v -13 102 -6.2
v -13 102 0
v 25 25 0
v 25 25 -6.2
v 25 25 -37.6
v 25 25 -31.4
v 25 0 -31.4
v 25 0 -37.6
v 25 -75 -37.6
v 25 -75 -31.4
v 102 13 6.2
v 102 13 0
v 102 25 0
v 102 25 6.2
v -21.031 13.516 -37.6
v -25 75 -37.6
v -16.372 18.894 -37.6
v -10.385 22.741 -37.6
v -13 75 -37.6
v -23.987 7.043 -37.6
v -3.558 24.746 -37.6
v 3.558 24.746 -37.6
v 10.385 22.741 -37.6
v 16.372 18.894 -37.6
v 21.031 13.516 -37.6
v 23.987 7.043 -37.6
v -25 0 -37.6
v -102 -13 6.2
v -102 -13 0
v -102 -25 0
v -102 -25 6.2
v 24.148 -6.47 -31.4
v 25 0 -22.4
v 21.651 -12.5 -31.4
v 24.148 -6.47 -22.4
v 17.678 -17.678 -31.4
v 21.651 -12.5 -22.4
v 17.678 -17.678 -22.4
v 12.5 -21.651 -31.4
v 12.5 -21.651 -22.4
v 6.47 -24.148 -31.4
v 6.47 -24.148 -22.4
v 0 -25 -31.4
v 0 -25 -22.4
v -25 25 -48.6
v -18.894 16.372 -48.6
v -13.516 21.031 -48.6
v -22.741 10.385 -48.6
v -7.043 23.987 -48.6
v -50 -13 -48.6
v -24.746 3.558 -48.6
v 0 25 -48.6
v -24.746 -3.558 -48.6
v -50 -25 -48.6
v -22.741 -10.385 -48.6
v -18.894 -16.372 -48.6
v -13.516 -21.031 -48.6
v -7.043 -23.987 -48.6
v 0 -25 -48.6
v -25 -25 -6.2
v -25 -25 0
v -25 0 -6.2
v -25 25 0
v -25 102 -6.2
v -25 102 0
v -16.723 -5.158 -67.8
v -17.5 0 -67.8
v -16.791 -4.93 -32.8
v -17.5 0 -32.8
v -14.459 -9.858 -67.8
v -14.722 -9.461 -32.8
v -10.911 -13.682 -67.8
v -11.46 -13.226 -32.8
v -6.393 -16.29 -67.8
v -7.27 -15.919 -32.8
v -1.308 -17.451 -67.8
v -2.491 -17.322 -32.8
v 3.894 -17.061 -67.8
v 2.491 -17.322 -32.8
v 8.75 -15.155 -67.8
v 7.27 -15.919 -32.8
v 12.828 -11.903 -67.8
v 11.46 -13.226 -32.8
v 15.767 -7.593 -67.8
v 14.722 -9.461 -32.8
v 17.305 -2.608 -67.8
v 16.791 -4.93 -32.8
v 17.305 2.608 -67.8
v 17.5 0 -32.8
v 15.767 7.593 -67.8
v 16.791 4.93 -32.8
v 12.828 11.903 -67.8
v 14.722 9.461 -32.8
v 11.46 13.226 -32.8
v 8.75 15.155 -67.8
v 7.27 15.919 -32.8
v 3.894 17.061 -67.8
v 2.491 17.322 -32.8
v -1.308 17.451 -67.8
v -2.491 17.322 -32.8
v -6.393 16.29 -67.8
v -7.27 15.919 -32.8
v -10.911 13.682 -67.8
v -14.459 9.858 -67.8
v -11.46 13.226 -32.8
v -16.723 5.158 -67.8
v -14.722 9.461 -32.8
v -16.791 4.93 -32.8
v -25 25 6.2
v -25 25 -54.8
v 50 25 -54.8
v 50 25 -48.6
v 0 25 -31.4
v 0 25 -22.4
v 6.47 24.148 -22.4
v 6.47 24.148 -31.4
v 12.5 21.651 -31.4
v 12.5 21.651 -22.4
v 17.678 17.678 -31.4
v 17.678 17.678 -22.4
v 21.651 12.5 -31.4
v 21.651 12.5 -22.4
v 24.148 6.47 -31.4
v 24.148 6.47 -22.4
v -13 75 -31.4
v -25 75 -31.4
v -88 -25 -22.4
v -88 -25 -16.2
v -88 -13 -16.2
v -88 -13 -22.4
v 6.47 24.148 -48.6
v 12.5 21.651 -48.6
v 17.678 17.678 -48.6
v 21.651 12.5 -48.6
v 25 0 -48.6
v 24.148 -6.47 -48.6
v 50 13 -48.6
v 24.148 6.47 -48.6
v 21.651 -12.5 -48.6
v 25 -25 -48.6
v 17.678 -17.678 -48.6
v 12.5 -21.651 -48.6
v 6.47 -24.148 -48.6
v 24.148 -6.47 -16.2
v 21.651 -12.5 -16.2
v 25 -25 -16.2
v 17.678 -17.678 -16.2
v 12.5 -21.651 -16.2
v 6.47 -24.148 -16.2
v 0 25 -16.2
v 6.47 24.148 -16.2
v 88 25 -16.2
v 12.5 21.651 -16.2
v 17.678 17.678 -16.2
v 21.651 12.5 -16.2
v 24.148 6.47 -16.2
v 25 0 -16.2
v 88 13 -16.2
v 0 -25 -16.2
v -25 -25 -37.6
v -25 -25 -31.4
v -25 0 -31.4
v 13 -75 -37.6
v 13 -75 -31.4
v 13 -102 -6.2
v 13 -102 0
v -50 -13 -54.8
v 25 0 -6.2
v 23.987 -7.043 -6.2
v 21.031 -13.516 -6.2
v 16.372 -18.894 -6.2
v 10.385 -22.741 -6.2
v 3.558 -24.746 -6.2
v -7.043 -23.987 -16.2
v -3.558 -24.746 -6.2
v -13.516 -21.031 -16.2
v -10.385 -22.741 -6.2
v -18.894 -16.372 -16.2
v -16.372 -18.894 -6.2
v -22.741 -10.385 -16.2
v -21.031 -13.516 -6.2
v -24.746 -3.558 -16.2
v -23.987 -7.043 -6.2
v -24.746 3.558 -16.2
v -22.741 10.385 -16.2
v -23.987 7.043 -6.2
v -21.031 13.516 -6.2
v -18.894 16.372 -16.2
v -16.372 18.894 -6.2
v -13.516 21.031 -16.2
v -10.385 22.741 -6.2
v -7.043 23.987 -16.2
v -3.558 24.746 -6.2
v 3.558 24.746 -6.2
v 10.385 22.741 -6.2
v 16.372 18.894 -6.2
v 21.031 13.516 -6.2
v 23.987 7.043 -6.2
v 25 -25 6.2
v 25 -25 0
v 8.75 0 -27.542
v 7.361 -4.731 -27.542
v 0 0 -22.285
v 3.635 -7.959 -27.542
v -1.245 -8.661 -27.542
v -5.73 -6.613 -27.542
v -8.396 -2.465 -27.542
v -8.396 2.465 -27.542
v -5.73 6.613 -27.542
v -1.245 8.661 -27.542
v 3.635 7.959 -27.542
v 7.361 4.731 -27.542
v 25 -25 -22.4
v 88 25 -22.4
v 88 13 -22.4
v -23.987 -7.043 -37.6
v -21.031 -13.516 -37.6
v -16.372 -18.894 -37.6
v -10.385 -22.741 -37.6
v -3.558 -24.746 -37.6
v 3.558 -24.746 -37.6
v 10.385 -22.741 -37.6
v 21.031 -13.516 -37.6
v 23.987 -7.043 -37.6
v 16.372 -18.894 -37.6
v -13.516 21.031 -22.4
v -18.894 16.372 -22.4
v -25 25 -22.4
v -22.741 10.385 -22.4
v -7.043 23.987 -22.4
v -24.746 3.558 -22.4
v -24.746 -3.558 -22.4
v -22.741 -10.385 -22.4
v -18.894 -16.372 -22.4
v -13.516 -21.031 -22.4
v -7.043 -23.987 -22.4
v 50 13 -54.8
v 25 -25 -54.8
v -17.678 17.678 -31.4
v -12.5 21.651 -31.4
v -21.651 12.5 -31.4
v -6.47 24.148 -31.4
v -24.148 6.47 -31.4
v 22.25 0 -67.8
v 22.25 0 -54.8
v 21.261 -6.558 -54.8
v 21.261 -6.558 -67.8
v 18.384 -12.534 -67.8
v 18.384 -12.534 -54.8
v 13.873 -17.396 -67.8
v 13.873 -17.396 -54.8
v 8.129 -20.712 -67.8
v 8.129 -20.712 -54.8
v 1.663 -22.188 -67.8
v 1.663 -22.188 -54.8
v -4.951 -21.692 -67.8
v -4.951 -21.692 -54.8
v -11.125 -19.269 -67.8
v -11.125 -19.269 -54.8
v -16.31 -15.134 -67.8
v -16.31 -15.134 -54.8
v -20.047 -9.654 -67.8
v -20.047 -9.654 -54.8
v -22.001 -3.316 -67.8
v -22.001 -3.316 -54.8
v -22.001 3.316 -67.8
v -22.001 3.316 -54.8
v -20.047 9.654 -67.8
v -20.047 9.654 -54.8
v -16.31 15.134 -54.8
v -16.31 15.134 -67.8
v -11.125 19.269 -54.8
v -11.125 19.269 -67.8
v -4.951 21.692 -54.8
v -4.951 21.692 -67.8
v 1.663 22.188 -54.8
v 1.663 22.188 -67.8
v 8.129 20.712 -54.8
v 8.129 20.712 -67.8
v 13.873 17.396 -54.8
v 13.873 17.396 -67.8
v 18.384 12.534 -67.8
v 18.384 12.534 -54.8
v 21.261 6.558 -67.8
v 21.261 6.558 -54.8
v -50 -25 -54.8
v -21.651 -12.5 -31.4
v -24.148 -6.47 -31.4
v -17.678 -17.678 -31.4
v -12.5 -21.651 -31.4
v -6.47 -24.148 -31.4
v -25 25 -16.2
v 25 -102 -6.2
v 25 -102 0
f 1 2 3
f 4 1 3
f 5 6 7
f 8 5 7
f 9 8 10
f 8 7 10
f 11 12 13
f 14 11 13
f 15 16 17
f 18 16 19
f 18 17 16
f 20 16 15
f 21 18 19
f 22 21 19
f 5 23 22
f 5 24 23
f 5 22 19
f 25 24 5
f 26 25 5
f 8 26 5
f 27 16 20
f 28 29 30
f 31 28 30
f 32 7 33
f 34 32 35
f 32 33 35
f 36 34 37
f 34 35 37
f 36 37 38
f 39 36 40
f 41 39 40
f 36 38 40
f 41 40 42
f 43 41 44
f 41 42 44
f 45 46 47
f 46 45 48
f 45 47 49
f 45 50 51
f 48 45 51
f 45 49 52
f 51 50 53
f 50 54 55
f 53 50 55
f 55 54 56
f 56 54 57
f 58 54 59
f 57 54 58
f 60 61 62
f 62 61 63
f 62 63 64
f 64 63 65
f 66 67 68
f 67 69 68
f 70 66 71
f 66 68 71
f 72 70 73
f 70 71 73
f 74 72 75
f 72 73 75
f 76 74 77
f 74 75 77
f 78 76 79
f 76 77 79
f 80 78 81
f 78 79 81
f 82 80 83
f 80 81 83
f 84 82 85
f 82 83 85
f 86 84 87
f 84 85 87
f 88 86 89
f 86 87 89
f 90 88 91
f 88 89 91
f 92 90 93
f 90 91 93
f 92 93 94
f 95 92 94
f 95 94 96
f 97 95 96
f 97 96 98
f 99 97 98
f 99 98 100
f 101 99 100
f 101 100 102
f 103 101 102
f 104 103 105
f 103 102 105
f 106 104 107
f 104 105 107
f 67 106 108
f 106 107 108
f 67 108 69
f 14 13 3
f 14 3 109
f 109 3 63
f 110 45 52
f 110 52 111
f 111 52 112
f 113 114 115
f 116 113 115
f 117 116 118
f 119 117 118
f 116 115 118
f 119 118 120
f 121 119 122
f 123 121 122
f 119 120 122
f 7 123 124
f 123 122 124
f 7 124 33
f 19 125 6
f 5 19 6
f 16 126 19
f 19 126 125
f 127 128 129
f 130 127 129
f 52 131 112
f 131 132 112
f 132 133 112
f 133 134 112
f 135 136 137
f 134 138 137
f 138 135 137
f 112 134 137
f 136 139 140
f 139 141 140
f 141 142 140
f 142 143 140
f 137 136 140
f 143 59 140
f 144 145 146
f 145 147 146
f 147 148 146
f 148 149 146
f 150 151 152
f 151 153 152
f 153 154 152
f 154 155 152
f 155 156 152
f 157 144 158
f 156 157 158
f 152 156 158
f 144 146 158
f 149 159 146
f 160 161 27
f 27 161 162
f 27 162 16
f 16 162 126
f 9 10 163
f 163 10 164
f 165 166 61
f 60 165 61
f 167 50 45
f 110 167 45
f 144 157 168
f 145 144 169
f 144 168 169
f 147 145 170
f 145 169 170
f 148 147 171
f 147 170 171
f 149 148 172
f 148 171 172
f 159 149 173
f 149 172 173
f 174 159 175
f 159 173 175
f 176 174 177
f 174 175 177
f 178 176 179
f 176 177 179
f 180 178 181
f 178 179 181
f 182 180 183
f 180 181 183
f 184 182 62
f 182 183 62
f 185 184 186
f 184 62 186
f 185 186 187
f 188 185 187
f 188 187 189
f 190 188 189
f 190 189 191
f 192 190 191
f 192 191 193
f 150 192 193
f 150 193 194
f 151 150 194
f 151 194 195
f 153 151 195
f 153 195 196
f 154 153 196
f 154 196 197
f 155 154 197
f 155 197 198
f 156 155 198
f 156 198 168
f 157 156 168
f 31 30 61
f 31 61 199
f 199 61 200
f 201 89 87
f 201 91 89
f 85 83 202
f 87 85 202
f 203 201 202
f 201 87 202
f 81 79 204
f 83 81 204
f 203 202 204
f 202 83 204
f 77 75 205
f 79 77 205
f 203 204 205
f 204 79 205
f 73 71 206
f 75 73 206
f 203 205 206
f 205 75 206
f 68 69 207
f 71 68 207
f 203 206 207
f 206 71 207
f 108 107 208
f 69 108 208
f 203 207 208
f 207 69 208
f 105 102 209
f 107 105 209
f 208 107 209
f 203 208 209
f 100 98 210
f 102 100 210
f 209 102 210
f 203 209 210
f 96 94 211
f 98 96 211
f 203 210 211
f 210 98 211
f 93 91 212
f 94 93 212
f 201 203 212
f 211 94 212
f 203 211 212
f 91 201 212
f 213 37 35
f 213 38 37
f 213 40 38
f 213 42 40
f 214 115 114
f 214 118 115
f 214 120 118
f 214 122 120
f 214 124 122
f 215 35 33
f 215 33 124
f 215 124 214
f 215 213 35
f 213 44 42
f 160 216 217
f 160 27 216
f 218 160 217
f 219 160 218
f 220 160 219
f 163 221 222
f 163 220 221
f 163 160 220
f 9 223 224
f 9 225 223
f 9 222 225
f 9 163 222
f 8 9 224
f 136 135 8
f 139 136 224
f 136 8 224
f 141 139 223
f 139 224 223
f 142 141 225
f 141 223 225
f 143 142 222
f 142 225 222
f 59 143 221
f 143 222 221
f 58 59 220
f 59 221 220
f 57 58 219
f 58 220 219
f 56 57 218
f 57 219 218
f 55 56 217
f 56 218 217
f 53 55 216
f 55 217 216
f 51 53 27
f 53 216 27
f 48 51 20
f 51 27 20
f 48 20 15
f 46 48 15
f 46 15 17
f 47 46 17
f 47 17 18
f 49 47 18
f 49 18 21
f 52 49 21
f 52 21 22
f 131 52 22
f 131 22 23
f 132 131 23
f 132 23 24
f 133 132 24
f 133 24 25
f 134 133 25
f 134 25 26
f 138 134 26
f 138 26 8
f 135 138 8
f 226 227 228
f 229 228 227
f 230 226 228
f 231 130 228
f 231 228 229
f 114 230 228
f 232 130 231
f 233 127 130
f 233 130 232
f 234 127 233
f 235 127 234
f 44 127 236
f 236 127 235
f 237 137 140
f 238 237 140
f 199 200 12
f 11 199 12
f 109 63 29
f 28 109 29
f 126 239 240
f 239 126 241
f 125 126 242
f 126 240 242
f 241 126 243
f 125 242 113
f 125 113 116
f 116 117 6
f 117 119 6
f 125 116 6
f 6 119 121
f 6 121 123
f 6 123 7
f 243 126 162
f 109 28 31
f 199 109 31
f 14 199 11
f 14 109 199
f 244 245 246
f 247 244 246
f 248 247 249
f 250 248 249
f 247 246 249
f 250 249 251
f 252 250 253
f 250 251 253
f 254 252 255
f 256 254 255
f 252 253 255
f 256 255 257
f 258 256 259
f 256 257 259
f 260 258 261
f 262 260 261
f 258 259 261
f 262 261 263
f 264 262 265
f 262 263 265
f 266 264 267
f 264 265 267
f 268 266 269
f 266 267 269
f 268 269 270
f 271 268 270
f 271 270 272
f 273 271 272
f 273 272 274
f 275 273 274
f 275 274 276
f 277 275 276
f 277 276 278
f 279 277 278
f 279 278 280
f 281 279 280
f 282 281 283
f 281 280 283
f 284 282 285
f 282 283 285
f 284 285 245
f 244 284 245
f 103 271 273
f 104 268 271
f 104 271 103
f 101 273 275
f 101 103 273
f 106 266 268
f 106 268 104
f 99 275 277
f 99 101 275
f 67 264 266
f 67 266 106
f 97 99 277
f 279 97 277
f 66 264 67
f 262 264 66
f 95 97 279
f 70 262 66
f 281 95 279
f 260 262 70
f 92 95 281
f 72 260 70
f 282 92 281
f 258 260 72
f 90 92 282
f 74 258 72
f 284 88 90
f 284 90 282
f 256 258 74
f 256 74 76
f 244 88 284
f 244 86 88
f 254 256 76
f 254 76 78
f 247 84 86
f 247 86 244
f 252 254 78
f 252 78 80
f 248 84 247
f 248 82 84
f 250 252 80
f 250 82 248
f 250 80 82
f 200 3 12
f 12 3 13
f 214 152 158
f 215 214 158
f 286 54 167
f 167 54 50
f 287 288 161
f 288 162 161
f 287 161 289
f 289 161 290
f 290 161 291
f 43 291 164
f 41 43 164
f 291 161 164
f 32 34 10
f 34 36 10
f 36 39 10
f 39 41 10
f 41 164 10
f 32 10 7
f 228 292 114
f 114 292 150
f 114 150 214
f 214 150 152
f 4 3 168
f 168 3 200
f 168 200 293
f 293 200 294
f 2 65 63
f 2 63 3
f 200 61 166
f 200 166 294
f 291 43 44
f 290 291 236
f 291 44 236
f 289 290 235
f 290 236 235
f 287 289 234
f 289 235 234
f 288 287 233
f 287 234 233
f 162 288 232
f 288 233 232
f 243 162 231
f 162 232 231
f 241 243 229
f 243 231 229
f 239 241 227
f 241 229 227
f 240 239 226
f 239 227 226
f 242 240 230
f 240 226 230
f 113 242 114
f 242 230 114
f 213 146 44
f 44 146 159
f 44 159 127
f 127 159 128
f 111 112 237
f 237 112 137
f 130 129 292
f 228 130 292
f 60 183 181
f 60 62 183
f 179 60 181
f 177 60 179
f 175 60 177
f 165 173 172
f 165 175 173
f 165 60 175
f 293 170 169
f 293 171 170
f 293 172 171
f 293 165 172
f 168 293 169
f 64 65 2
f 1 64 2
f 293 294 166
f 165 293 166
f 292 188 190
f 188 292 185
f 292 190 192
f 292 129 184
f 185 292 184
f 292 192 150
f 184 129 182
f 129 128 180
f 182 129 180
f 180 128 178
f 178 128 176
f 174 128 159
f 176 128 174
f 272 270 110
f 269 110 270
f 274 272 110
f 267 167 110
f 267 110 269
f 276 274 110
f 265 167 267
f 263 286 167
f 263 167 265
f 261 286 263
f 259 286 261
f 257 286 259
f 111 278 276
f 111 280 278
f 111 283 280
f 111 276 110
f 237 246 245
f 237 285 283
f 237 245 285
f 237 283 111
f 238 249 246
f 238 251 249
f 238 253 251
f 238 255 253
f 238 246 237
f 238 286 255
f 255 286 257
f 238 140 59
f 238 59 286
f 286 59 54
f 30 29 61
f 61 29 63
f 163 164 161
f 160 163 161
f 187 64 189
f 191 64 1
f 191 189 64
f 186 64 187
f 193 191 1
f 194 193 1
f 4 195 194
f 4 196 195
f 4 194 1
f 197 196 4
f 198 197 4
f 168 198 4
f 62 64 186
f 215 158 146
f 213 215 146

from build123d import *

# Parameters (mm, degrees)
F1_DEPTH  = 6.2
F3_DEPTH  = 6.2
F5_DEPTH  = 10
F7_DEPTH  = 6.2
F9_DEPTH  = 9
F11_DEPTH = 6.2
F13_DEPTH = 11
F15_DEPTH = 6.2
F16_R     = 22.25
F17_DEPTH = 13
F19_D     = 35
F19_DEPTH = 35
F19_TIP   = 10.515060833


# Not quite as in the source:
# - a feature names something its author has since deleted; it is built from what else it names


with BuildPart() as f1:
    # F0 (on Top) → F1 (new body)
    with BuildSketch(Plane.XY):
        Polygon((11.0905365064, -25), (25, -25), (102, 13), (102, 25), (11.0905365064, 25), (-11.0905365064, 25), (-25, 25), (-102, -13), (-102, -25), (-11.0905365064, -25), align=None)
    extrude(amount=F1_DEPTH)

    # F2 (on face) → F3 (join)
    with BuildSketch(Plane(origin=(0, 0, 0), x_dir=(1, 0, 0), z_dir=(0, 0, -1))):
        Polygon((-25, 25), (-25, 0), (-25, -25), (25, -25), (25, 0), (25, 25), align=None)
        Polygon((25, -25), (-25, -25), (-25, -102), (-13, -102), align=None)
        Polygon((13, 102), (-25, 25), (25, 25), (25, 102), align=None)
    extrude(amount=F3_DEPTH)

    # F4 (on face) → F5 (join)
    with BuildSketch(Plane(origin=(0, 0, -6.2), x_dir=(1, 0, 0), z_dir=(0, 0, -1))):
        with BuildLine():
            ThreePointArc((-25, 2.61e-08), (-1.3e-08, -25), (25, 0))
            ThreePointArc((25, 0), (1.3e-08, 25), (-25, 2.61e-08))
        make_face()
    extrude(amount=F5_DEPTH)

    # F6 (on face) → F7 (join)
    with BuildSketch(Plane(origin=(0, 0, -16.2), x_dir=(1, 0, 0), z_dir=(0, 0, -1))):
        with BuildLine():
            Line((-5.83e-08, -25), (25, -25))
            Line((25, -25), (25, 0))
            ThreePointArc((25, 0), (17.677669509, -17.6776695503), (-5.83e-08, -25))
        make_face()
        with BuildLine():
            Line((-25, -25), (-5.83e-08, -25))
            ThreePointArc((-5.83e-08, -25), (-17.6776695503, -17.677669509), (-25, 0))
            Line((-25, 0), (-25, -25))
        make_face()
        Polygon((25, 0), (25, -25), (88, -25), (88, -13), (25, 25), align=None)
        Polygon((-88, 13), (-25, -25), (-25, 0), (-25, 25), (-88, 25), align=None)
        with BuildLine():
            ThreePointArc((-25, 0), (-17.6776695503, -17.677669509), (-5.83e-08, -25))
            ThreePointArc((-5.83e-08, -25), (17.677669509, -17.6776695503), (25, 0))
            ThreePointArc((25, 0), (17.6776695297, 17.6776695297), (0, 25))
            ThreePointArc((0, 25), (-17.6776695297, 17.6776695297), (-25, 0))
        make_face()
        with BuildLine():
            Line((-25, 25), (-25, 0))
            ThreePointArc((-25, 0), (-17.6776695297, 17.6776695297), (0, 25))
            Line((0, 25), (-25, 25))
        make_face()
        with BuildLine():
            ThreePointArc((0, 25), (17.6776695297, 17.6776695297), (25, 0))
            Line((25, 0), (25, 25))
            Line((25, 25), (0, 25))
        make_face()
    extrude(amount=F7_DEPTH)

    # F8 (on face) → F9 (join)
    with BuildSketch(Plane(origin=(0, 0, -22.4), x_dir=(1, 0, 0), z_dir=(0, 0, -1))):
        with BuildLine():
            ThreePointArc((-5.83e-08, -25), (17.677669509, -17.6776695503), (25, 0))
            ThreePointArc((25, 0), (17.6776695297, 17.6776695297), (0, 25))
            ThreePointArc((0, 25), (-25, 2.92e-08), (-5.83e-08, -25))
        make_face()
    extrude(amount=F9_DEPTH)

    # F10 (on face) → F11 (join)
    with BuildSketch(Plane(origin=(0, 0, -31.4), x_dir=(1, 0, 0), z_dir=(0, 0, -1))):
        Polygon((13, 75), (-25, 25), (4.22e-08, 25), (25, 25), (25, 75), align=None)
        with BuildLine():
            ThreePointArc((4.22e-08, 25), (17.6776695446, 17.6776695147), (25, 0))
            Line((25, 0), (25, 25))
            Line((25, 25), (4.22e-08, 25))
        make_face()
        with BuildLine():
            ThreePointArc((-25, 0), (-17.6776695332, -17.6776695262), (-9.9e-09, -25))
            ThreePointArc((-9.9e-09, -25), (17.6776695262, -17.6776695332), (25, 0))
            ThreePointArc((25, 0), (17.6776695446, 17.6776695147), (4.22e-08, 25))
            ThreePointArc((4.22e-08, 25), (-17.6776695147, 17.6776695446), (-25, 0))
        make_face()
        with BuildLine():
            ThreePointArc((25, 0), (17.6776695262, -17.6776695332), (-9.9e-09, -25))
            Line((-9.9e-09, -25), (25, -25))
            Line((25, -25), (25, 0))
        make_face()
        Polygon((-9.9e-09, -25), (-25, -25), (-25, -75), (-13, -75), (25, -25), align=None)
        with BuildLine():
            Line((-25, 0), (-25, -25))
            Line((-25, -25), (-9.9e-09, -25))
            ThreePointArc((-9.9e-09, -25), (-17.6776695332, -17.6776695262), (-25, 0))
        make_face()
        with BuildLine():
            Line((-25, 25), (-25, 0))
            ThreePointArc((-25, 0), (-17.6776695147, 17.6776695446), (4.22e-08, 25))
            Line((4.22e-08, 25), (-25, 25))
        make_face()
    extrude(amount=F11_DEPTH)

    # F12 (on face) → F13 (join)
    with BuildSketch(Plane(origin=(0, 0, -37.6), x_dir=(1, 0, 0), z_dir=(0, 0, -1))):
        with BuildLine():
            ThreePointArc((-25, 2.61e-08), (-1.3e-08, -25), (25, 0))
            ThreePointArc((25, 0), (1.3e-08, 25), (-25, 2.61e-08))
        make_face()
    extrude(amount=F13_DEPTH)

    # F14 (on face) → F15 (join)
    with BuildSketch(Plane(origin=(0, 0, -48.6), x_dir=(1, 0, 0), z_dir=(0, 0, -1))):
        with BuildLine():
            ThreePointArc((-25, 0), (-17.6776695204, -17.6776695389), (2.61e-08, -25))
            ThreePointArc((2.61e-08, -25), (17.6776695389, -17.6776695204), (25, 0))
            ThreePointArc((25, 0), (17.6776695389, 17.6776695204), (2.61e-08, 25))
            ThreePointArc((2.61e-08, 25), (-17.6776695204, 17.6776695389), (-25, 0))
        make_face()
        with BuildLine():
            ThreePointArc((2.61e-08, 25), (17.6776695389, 17.6776695204), (25, 0))
            Line((25, 0), (25, 25))
            Line((25, 25), (2.61e-08, 25))
        make_face()
        with BuildLine():
            Line((2.61e-08, -25), (25, -25))
            Line((25, -25), (25, 0))
            ThreePointArc((25, 0), (17.6776695389, -17.6776695204), (2.61e-08, -25))
        make_face()
        with BuildLine():
            Line((-25, -25), (2.61e-08, -25))
            ThreePointArc((2.61e-08, -25), (-17.6776695204, -17.6776695389), (-25, 0))
            Line((-25, 0), (-25, -25))
        make_face()
        with BuildLine():
            Line((-25, 25), (-25, 0))
            ThreePointArc((-25, 0), (-17.6776695204, 17.6776695389), (2.61e-08, 25))
            Line((2.61e-08, 25), (-25, 25))
        make_face()
        Polygon((-50, 13), (-25, -25), (-25, 0), (-25, 25), (-50, 25), align=None)
        Polygon((25, 0), (25, -25), (50, -25), (50, -13), (25, 25), align=None)
    extrude(amount=F15_DEPTH)

    # F16 (on face) → F17 (join)
    with BuildSketch(Plane(origin=(0, 0, -54.8), x_dir=(1, 0, 0), z_dir=(0, 0, -1))):
        Circle(F16_R)
    extrude(amount=F17_DEPTH)

    # F19
    with Locations(Plane(origin=(0, 0, -67.8), x_dir=(1, 0, 0), z_dir=(0, 0, -1))):
        with Locations((0, 0)):
            Hole(F19_D / 2, depth=F19_DEPTH)
            with Locations((0, 0, -(F19_DEPTH + F19_TIP / 2))):  # 118° drill point
                Cone(0, F19_D / 2, F19_TIP, mode=Mode.SUBTRACT)


solid = f1.part
